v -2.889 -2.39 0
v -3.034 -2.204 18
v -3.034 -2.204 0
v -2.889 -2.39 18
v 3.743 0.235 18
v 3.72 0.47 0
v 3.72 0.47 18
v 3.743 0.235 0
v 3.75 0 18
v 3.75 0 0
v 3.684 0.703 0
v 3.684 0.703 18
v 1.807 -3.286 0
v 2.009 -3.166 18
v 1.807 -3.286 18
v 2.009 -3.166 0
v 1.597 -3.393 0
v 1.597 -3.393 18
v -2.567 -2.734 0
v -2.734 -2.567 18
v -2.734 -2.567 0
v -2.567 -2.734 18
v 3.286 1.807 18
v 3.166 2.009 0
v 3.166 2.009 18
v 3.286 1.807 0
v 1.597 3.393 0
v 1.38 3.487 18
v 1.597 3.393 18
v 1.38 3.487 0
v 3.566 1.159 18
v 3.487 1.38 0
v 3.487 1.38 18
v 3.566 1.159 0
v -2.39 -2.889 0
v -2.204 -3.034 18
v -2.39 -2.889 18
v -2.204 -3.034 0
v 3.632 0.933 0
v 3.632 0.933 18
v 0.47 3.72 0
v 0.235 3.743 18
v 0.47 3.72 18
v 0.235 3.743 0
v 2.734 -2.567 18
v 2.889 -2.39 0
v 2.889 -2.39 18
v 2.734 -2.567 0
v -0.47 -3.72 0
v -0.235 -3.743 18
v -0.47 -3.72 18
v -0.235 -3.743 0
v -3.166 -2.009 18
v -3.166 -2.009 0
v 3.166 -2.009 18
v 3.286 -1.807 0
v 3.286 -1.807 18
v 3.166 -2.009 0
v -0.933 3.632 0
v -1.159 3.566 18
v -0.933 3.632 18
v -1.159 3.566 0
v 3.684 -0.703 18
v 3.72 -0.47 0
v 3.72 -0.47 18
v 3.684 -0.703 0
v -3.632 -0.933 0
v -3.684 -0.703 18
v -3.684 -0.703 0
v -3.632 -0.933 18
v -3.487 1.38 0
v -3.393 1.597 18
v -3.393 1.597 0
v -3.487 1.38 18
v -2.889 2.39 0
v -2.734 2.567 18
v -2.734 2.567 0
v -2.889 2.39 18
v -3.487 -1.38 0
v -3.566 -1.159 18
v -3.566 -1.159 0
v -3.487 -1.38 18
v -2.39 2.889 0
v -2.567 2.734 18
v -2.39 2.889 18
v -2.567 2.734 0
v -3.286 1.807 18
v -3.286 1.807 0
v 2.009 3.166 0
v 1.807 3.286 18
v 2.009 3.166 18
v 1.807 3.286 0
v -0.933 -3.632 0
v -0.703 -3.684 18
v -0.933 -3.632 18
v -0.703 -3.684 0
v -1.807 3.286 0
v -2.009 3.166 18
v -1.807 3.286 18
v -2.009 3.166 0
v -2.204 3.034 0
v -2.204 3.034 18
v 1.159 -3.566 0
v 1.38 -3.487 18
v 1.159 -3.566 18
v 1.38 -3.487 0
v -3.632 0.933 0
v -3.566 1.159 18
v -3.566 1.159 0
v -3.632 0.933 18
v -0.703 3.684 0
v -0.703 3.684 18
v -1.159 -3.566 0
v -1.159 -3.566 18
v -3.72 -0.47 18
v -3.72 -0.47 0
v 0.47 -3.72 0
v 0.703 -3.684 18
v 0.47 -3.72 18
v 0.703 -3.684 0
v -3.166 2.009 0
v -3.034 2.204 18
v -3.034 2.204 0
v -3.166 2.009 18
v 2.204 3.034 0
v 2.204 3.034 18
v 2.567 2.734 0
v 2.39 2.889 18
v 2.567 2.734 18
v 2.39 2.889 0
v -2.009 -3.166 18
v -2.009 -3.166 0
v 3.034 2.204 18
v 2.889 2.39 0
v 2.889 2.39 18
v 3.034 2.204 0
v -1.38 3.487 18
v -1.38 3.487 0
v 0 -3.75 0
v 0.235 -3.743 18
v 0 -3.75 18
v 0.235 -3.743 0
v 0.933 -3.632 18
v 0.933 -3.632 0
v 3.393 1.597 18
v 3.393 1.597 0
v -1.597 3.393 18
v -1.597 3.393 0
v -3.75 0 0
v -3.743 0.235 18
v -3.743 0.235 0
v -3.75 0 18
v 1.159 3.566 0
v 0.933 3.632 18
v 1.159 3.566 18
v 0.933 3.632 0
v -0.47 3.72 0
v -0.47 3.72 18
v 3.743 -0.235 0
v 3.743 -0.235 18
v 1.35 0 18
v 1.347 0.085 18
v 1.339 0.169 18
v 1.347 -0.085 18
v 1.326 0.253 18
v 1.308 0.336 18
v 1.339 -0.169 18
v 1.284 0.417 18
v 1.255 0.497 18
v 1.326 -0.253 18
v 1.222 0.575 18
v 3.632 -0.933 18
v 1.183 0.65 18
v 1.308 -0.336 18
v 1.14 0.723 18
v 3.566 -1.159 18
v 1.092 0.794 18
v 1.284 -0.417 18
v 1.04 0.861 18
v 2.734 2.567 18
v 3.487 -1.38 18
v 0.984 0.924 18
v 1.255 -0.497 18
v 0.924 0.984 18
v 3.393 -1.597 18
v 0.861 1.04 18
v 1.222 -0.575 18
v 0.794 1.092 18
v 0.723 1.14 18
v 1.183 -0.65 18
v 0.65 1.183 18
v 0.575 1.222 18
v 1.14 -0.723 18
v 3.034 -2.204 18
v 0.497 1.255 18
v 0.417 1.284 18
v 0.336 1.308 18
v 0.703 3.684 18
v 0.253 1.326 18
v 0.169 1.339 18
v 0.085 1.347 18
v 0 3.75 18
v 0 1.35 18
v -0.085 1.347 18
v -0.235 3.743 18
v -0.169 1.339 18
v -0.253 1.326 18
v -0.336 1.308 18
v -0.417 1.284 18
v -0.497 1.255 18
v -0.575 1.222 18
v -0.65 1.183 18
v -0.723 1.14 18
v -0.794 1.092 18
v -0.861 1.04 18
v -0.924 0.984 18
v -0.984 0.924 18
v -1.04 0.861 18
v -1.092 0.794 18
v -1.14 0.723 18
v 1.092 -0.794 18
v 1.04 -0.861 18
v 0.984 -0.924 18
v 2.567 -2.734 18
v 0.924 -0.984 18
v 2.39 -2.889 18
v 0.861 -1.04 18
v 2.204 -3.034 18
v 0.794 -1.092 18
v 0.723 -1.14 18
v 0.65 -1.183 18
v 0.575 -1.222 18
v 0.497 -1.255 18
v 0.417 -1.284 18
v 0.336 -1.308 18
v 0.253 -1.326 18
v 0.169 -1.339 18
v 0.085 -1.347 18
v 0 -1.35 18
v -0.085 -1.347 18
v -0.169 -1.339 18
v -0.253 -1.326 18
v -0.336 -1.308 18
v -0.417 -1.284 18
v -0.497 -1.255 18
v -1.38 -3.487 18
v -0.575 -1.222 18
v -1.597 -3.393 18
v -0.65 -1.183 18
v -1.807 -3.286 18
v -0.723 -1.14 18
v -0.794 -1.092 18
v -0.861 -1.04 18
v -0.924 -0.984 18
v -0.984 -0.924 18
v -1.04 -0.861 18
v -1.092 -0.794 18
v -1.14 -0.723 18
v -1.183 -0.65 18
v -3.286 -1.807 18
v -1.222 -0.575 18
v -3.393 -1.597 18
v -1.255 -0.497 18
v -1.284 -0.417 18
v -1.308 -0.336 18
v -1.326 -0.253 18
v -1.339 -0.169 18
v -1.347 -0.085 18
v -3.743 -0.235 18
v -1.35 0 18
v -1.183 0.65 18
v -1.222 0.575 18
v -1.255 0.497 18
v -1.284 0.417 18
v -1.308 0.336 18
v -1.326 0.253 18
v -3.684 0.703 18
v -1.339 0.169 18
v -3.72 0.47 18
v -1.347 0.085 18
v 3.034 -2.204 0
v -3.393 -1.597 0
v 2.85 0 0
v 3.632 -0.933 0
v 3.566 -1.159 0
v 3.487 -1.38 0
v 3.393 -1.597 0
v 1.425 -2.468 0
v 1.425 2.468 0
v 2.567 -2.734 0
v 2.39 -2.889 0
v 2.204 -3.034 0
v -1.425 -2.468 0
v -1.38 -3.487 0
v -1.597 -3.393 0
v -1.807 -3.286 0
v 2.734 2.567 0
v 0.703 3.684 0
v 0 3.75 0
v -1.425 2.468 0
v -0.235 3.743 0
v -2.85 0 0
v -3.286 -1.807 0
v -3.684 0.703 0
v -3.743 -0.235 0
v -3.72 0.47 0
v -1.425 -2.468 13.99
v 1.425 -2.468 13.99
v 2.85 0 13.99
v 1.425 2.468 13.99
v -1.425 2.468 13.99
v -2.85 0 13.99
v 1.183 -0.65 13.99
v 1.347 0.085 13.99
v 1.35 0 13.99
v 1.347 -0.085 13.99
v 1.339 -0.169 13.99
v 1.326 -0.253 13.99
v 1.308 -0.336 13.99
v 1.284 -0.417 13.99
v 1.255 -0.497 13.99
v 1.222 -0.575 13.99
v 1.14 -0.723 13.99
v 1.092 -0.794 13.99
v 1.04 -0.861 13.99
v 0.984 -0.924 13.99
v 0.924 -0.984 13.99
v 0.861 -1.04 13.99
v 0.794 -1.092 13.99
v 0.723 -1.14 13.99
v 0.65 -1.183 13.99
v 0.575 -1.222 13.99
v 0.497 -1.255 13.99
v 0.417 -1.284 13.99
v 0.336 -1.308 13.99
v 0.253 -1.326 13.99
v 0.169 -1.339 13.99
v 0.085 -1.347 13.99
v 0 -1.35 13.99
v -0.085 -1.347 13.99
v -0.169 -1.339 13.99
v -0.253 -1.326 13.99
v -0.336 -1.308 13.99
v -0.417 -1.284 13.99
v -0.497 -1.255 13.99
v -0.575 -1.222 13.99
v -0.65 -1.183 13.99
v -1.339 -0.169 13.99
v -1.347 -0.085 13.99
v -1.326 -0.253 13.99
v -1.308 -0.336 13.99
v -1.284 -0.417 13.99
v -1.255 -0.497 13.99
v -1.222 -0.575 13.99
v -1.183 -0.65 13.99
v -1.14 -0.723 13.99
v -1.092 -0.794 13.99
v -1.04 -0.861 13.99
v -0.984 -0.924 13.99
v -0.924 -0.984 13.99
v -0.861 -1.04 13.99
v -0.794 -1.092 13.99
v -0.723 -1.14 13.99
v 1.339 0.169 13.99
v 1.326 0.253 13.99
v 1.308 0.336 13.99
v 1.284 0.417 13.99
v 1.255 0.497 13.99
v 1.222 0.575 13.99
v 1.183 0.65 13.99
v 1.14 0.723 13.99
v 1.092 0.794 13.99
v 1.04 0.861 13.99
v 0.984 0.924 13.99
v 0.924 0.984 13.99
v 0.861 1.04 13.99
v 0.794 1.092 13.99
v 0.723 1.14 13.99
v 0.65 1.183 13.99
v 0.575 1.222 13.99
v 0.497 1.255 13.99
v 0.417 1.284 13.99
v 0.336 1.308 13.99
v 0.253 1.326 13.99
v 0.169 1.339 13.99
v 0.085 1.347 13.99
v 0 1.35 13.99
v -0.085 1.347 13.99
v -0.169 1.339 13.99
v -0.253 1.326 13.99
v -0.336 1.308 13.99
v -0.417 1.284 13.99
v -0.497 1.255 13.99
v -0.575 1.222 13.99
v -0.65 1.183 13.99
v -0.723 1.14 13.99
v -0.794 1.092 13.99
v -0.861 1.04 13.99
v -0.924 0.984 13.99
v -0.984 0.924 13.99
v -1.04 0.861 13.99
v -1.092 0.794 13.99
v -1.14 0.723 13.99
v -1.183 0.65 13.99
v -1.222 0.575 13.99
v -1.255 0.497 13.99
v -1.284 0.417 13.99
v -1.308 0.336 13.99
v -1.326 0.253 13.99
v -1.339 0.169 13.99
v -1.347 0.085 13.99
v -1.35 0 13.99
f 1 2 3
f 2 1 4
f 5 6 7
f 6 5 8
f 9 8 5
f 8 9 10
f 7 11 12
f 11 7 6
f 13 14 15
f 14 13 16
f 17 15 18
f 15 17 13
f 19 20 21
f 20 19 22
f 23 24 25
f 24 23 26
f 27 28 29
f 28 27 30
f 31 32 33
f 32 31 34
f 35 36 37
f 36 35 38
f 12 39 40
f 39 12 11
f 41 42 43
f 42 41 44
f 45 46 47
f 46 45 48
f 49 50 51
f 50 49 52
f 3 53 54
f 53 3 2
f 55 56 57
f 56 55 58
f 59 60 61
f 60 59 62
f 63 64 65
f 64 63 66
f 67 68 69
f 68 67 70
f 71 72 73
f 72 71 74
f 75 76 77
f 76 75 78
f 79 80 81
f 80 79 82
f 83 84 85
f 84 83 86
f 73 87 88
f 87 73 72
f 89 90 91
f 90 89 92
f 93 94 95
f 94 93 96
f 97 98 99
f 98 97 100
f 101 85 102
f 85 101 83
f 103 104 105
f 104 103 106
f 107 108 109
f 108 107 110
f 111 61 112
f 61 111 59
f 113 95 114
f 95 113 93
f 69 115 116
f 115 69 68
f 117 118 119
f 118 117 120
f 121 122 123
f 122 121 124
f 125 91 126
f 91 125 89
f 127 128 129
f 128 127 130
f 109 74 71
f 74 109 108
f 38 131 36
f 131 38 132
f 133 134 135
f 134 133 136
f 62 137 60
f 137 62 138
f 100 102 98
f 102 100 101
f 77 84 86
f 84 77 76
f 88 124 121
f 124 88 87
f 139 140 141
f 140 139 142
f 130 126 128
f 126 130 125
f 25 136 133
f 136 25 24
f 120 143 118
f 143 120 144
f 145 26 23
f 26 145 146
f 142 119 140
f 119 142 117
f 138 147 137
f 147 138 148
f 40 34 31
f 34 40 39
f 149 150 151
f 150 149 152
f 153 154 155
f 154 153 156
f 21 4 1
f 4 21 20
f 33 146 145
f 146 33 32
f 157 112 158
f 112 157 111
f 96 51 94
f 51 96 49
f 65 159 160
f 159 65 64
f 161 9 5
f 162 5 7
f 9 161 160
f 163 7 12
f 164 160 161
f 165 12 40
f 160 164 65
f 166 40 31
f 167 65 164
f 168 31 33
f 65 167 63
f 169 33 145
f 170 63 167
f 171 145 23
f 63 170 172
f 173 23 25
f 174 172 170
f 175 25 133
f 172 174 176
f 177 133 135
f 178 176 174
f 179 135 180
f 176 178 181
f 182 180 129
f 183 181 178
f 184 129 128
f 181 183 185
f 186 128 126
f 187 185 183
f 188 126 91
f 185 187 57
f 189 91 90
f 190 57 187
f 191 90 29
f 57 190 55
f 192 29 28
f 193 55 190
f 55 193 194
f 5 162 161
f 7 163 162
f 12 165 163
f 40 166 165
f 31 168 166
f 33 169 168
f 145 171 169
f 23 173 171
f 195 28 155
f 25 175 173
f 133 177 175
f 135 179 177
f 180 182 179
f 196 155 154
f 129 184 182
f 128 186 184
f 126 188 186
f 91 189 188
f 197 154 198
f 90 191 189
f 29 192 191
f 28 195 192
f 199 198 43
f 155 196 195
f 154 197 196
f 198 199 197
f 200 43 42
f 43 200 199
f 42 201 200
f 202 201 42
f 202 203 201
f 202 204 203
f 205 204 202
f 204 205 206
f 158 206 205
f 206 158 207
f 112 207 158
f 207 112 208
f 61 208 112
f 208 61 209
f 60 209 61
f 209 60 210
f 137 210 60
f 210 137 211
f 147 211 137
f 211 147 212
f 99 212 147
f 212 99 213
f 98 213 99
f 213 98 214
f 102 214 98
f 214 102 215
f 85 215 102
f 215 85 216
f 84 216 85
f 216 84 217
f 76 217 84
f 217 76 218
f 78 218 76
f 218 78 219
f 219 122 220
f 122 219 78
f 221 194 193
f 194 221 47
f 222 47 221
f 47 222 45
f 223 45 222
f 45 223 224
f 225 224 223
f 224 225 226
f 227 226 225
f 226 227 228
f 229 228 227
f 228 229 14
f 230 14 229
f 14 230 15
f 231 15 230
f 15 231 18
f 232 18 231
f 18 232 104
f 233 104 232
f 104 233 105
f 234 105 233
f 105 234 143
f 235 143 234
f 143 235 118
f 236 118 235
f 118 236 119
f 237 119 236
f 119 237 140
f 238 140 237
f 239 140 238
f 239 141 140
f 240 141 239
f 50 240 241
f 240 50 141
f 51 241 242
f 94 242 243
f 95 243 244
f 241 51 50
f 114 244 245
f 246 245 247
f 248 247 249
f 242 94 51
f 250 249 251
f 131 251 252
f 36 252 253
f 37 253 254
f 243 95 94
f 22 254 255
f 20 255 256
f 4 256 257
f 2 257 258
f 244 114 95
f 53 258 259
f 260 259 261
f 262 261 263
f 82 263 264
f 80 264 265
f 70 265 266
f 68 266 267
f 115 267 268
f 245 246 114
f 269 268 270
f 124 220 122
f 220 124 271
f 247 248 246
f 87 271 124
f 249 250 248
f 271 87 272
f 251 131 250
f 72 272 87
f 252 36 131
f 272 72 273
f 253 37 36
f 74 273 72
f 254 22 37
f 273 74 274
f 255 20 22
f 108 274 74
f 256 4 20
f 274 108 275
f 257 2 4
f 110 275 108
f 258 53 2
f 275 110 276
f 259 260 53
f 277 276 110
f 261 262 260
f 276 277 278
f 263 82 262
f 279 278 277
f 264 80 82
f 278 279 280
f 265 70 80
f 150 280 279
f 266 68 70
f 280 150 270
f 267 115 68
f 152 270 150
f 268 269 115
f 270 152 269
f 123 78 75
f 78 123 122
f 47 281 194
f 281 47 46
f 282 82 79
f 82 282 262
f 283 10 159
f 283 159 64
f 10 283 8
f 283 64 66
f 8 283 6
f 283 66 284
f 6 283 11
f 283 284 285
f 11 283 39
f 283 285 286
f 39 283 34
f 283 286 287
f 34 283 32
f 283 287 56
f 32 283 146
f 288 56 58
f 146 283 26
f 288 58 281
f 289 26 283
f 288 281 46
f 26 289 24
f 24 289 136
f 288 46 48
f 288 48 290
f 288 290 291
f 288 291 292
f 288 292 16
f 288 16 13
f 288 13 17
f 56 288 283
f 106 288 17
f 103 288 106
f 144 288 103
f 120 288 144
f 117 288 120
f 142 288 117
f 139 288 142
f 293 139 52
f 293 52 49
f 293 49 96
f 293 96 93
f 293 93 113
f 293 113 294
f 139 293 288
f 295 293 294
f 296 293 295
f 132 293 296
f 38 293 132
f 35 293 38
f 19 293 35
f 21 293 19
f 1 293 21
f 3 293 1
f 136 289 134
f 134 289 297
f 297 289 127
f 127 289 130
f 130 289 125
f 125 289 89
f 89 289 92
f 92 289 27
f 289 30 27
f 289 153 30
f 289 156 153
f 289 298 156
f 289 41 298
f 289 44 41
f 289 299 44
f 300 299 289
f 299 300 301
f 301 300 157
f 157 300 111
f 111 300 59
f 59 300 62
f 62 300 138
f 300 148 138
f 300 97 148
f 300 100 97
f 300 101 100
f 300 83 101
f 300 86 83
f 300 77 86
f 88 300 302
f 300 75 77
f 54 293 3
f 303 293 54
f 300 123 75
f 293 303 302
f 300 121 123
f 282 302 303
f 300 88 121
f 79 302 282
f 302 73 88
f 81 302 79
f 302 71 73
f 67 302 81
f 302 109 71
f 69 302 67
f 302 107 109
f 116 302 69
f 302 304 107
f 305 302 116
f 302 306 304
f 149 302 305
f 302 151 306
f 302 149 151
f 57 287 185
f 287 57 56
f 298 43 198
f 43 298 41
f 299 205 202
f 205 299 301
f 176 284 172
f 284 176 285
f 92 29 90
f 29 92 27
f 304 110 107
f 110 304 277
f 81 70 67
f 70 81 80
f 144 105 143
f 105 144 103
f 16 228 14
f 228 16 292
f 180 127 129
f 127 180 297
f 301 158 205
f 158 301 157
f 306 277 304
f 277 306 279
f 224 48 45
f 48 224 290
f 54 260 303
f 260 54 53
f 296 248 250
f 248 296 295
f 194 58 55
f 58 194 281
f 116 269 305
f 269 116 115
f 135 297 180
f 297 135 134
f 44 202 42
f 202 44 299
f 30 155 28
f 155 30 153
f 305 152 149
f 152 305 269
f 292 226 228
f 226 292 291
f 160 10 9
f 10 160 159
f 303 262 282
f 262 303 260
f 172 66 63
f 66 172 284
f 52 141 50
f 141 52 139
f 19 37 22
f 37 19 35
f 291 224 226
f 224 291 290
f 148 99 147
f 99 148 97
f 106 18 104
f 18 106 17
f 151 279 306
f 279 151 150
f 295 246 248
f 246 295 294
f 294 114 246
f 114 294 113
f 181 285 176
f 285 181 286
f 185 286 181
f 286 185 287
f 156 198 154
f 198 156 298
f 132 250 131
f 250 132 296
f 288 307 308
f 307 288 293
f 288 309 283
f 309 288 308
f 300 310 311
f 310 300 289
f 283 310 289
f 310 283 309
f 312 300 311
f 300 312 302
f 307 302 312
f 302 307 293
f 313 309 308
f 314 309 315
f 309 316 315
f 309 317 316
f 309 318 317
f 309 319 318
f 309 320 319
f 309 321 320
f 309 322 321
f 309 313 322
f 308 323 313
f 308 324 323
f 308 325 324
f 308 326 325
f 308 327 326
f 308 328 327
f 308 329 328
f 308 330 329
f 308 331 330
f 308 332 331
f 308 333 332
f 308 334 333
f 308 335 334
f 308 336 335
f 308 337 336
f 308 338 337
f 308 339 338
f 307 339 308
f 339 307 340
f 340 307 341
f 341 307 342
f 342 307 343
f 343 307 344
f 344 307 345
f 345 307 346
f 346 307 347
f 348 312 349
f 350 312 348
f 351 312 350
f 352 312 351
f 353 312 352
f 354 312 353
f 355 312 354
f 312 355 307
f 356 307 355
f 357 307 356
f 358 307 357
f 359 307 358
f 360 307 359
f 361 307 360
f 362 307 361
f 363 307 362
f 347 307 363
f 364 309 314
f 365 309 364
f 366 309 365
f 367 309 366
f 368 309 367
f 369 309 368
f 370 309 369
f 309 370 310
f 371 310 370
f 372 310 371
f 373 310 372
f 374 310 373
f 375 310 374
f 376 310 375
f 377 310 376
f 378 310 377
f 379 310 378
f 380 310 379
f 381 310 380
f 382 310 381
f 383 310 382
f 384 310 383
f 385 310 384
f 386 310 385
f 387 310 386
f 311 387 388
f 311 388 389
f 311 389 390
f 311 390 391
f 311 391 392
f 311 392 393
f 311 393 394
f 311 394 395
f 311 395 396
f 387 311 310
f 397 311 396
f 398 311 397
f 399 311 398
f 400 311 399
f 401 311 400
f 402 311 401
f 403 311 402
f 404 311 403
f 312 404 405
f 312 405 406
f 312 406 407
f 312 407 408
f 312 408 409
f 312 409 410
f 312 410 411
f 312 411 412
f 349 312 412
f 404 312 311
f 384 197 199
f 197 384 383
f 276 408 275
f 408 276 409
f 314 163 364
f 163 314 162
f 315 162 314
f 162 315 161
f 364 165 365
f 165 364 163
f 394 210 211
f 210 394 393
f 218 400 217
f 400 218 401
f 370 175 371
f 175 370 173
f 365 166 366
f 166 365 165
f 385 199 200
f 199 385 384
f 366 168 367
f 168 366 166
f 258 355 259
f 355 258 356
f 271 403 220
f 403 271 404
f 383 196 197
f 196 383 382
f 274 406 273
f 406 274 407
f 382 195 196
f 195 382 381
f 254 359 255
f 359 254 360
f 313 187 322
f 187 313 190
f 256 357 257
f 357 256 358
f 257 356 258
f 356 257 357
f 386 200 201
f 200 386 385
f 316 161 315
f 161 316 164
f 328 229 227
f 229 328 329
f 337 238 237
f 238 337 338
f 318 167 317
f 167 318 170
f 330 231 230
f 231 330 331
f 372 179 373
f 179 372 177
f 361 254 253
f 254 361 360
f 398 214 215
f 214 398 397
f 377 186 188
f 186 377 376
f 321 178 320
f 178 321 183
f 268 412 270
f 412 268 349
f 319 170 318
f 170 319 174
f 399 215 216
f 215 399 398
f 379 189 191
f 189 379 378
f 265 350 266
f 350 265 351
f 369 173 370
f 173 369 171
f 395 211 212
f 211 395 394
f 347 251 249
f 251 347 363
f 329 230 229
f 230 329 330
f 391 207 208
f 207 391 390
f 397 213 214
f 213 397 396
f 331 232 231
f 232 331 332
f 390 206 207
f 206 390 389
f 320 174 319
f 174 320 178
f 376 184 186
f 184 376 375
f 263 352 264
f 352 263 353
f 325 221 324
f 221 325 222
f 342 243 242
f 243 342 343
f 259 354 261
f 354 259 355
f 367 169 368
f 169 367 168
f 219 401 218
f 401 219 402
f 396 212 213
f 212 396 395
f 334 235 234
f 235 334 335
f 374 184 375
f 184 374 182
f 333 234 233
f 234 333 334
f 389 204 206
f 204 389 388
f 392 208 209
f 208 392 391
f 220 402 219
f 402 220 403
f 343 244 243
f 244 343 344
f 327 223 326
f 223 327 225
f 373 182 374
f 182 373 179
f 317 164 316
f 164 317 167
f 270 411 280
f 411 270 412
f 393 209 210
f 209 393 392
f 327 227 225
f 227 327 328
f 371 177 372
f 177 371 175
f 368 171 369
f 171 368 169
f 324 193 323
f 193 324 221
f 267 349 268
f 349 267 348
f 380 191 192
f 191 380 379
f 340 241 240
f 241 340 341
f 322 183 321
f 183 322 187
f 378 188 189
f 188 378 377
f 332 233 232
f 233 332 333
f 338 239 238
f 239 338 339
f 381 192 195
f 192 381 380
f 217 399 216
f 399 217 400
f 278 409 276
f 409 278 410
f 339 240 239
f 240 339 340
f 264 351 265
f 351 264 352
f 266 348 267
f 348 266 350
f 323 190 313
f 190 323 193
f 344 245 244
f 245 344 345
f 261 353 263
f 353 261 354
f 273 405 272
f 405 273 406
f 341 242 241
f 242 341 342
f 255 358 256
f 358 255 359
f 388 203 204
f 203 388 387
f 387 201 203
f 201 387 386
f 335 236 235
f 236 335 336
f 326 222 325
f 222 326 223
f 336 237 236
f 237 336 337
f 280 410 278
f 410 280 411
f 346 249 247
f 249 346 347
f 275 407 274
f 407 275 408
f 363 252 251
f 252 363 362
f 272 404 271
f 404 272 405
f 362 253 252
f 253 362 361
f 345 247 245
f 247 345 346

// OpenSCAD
// Model purpose: General-purpose printable standoff with screw through-hole and captive hex-nut pocket for mounting boards or panels with fixed spacing.
// Useful when you need quick custom-height supports without metal spacers, especially for one-off fixtures and electronics prototypes.
$fn = 100;
INF = 10000;
EPS = 0.01;

STANDOFF_DIAMETER = 7.5;
STANDOFF_HEIGHT = 18;
NUT_DIAMETER = 5.7;
NUT_HEIGHT = 14;
SCREW_DIAMETER = 2.7;

module standoff() {
  difference() {
    cylinder(h=STANDOFF_HEIGHT, d=STANDOFF_DIAMETER);
    translate([0, 0, -EPS]) cylinder(h=NUT_HEIGHT, d=NUT_DIAMETER, $fn=6);
    cylinder(h=INF, d=SCREW_DIAMETER);
  }
}

standoff();
